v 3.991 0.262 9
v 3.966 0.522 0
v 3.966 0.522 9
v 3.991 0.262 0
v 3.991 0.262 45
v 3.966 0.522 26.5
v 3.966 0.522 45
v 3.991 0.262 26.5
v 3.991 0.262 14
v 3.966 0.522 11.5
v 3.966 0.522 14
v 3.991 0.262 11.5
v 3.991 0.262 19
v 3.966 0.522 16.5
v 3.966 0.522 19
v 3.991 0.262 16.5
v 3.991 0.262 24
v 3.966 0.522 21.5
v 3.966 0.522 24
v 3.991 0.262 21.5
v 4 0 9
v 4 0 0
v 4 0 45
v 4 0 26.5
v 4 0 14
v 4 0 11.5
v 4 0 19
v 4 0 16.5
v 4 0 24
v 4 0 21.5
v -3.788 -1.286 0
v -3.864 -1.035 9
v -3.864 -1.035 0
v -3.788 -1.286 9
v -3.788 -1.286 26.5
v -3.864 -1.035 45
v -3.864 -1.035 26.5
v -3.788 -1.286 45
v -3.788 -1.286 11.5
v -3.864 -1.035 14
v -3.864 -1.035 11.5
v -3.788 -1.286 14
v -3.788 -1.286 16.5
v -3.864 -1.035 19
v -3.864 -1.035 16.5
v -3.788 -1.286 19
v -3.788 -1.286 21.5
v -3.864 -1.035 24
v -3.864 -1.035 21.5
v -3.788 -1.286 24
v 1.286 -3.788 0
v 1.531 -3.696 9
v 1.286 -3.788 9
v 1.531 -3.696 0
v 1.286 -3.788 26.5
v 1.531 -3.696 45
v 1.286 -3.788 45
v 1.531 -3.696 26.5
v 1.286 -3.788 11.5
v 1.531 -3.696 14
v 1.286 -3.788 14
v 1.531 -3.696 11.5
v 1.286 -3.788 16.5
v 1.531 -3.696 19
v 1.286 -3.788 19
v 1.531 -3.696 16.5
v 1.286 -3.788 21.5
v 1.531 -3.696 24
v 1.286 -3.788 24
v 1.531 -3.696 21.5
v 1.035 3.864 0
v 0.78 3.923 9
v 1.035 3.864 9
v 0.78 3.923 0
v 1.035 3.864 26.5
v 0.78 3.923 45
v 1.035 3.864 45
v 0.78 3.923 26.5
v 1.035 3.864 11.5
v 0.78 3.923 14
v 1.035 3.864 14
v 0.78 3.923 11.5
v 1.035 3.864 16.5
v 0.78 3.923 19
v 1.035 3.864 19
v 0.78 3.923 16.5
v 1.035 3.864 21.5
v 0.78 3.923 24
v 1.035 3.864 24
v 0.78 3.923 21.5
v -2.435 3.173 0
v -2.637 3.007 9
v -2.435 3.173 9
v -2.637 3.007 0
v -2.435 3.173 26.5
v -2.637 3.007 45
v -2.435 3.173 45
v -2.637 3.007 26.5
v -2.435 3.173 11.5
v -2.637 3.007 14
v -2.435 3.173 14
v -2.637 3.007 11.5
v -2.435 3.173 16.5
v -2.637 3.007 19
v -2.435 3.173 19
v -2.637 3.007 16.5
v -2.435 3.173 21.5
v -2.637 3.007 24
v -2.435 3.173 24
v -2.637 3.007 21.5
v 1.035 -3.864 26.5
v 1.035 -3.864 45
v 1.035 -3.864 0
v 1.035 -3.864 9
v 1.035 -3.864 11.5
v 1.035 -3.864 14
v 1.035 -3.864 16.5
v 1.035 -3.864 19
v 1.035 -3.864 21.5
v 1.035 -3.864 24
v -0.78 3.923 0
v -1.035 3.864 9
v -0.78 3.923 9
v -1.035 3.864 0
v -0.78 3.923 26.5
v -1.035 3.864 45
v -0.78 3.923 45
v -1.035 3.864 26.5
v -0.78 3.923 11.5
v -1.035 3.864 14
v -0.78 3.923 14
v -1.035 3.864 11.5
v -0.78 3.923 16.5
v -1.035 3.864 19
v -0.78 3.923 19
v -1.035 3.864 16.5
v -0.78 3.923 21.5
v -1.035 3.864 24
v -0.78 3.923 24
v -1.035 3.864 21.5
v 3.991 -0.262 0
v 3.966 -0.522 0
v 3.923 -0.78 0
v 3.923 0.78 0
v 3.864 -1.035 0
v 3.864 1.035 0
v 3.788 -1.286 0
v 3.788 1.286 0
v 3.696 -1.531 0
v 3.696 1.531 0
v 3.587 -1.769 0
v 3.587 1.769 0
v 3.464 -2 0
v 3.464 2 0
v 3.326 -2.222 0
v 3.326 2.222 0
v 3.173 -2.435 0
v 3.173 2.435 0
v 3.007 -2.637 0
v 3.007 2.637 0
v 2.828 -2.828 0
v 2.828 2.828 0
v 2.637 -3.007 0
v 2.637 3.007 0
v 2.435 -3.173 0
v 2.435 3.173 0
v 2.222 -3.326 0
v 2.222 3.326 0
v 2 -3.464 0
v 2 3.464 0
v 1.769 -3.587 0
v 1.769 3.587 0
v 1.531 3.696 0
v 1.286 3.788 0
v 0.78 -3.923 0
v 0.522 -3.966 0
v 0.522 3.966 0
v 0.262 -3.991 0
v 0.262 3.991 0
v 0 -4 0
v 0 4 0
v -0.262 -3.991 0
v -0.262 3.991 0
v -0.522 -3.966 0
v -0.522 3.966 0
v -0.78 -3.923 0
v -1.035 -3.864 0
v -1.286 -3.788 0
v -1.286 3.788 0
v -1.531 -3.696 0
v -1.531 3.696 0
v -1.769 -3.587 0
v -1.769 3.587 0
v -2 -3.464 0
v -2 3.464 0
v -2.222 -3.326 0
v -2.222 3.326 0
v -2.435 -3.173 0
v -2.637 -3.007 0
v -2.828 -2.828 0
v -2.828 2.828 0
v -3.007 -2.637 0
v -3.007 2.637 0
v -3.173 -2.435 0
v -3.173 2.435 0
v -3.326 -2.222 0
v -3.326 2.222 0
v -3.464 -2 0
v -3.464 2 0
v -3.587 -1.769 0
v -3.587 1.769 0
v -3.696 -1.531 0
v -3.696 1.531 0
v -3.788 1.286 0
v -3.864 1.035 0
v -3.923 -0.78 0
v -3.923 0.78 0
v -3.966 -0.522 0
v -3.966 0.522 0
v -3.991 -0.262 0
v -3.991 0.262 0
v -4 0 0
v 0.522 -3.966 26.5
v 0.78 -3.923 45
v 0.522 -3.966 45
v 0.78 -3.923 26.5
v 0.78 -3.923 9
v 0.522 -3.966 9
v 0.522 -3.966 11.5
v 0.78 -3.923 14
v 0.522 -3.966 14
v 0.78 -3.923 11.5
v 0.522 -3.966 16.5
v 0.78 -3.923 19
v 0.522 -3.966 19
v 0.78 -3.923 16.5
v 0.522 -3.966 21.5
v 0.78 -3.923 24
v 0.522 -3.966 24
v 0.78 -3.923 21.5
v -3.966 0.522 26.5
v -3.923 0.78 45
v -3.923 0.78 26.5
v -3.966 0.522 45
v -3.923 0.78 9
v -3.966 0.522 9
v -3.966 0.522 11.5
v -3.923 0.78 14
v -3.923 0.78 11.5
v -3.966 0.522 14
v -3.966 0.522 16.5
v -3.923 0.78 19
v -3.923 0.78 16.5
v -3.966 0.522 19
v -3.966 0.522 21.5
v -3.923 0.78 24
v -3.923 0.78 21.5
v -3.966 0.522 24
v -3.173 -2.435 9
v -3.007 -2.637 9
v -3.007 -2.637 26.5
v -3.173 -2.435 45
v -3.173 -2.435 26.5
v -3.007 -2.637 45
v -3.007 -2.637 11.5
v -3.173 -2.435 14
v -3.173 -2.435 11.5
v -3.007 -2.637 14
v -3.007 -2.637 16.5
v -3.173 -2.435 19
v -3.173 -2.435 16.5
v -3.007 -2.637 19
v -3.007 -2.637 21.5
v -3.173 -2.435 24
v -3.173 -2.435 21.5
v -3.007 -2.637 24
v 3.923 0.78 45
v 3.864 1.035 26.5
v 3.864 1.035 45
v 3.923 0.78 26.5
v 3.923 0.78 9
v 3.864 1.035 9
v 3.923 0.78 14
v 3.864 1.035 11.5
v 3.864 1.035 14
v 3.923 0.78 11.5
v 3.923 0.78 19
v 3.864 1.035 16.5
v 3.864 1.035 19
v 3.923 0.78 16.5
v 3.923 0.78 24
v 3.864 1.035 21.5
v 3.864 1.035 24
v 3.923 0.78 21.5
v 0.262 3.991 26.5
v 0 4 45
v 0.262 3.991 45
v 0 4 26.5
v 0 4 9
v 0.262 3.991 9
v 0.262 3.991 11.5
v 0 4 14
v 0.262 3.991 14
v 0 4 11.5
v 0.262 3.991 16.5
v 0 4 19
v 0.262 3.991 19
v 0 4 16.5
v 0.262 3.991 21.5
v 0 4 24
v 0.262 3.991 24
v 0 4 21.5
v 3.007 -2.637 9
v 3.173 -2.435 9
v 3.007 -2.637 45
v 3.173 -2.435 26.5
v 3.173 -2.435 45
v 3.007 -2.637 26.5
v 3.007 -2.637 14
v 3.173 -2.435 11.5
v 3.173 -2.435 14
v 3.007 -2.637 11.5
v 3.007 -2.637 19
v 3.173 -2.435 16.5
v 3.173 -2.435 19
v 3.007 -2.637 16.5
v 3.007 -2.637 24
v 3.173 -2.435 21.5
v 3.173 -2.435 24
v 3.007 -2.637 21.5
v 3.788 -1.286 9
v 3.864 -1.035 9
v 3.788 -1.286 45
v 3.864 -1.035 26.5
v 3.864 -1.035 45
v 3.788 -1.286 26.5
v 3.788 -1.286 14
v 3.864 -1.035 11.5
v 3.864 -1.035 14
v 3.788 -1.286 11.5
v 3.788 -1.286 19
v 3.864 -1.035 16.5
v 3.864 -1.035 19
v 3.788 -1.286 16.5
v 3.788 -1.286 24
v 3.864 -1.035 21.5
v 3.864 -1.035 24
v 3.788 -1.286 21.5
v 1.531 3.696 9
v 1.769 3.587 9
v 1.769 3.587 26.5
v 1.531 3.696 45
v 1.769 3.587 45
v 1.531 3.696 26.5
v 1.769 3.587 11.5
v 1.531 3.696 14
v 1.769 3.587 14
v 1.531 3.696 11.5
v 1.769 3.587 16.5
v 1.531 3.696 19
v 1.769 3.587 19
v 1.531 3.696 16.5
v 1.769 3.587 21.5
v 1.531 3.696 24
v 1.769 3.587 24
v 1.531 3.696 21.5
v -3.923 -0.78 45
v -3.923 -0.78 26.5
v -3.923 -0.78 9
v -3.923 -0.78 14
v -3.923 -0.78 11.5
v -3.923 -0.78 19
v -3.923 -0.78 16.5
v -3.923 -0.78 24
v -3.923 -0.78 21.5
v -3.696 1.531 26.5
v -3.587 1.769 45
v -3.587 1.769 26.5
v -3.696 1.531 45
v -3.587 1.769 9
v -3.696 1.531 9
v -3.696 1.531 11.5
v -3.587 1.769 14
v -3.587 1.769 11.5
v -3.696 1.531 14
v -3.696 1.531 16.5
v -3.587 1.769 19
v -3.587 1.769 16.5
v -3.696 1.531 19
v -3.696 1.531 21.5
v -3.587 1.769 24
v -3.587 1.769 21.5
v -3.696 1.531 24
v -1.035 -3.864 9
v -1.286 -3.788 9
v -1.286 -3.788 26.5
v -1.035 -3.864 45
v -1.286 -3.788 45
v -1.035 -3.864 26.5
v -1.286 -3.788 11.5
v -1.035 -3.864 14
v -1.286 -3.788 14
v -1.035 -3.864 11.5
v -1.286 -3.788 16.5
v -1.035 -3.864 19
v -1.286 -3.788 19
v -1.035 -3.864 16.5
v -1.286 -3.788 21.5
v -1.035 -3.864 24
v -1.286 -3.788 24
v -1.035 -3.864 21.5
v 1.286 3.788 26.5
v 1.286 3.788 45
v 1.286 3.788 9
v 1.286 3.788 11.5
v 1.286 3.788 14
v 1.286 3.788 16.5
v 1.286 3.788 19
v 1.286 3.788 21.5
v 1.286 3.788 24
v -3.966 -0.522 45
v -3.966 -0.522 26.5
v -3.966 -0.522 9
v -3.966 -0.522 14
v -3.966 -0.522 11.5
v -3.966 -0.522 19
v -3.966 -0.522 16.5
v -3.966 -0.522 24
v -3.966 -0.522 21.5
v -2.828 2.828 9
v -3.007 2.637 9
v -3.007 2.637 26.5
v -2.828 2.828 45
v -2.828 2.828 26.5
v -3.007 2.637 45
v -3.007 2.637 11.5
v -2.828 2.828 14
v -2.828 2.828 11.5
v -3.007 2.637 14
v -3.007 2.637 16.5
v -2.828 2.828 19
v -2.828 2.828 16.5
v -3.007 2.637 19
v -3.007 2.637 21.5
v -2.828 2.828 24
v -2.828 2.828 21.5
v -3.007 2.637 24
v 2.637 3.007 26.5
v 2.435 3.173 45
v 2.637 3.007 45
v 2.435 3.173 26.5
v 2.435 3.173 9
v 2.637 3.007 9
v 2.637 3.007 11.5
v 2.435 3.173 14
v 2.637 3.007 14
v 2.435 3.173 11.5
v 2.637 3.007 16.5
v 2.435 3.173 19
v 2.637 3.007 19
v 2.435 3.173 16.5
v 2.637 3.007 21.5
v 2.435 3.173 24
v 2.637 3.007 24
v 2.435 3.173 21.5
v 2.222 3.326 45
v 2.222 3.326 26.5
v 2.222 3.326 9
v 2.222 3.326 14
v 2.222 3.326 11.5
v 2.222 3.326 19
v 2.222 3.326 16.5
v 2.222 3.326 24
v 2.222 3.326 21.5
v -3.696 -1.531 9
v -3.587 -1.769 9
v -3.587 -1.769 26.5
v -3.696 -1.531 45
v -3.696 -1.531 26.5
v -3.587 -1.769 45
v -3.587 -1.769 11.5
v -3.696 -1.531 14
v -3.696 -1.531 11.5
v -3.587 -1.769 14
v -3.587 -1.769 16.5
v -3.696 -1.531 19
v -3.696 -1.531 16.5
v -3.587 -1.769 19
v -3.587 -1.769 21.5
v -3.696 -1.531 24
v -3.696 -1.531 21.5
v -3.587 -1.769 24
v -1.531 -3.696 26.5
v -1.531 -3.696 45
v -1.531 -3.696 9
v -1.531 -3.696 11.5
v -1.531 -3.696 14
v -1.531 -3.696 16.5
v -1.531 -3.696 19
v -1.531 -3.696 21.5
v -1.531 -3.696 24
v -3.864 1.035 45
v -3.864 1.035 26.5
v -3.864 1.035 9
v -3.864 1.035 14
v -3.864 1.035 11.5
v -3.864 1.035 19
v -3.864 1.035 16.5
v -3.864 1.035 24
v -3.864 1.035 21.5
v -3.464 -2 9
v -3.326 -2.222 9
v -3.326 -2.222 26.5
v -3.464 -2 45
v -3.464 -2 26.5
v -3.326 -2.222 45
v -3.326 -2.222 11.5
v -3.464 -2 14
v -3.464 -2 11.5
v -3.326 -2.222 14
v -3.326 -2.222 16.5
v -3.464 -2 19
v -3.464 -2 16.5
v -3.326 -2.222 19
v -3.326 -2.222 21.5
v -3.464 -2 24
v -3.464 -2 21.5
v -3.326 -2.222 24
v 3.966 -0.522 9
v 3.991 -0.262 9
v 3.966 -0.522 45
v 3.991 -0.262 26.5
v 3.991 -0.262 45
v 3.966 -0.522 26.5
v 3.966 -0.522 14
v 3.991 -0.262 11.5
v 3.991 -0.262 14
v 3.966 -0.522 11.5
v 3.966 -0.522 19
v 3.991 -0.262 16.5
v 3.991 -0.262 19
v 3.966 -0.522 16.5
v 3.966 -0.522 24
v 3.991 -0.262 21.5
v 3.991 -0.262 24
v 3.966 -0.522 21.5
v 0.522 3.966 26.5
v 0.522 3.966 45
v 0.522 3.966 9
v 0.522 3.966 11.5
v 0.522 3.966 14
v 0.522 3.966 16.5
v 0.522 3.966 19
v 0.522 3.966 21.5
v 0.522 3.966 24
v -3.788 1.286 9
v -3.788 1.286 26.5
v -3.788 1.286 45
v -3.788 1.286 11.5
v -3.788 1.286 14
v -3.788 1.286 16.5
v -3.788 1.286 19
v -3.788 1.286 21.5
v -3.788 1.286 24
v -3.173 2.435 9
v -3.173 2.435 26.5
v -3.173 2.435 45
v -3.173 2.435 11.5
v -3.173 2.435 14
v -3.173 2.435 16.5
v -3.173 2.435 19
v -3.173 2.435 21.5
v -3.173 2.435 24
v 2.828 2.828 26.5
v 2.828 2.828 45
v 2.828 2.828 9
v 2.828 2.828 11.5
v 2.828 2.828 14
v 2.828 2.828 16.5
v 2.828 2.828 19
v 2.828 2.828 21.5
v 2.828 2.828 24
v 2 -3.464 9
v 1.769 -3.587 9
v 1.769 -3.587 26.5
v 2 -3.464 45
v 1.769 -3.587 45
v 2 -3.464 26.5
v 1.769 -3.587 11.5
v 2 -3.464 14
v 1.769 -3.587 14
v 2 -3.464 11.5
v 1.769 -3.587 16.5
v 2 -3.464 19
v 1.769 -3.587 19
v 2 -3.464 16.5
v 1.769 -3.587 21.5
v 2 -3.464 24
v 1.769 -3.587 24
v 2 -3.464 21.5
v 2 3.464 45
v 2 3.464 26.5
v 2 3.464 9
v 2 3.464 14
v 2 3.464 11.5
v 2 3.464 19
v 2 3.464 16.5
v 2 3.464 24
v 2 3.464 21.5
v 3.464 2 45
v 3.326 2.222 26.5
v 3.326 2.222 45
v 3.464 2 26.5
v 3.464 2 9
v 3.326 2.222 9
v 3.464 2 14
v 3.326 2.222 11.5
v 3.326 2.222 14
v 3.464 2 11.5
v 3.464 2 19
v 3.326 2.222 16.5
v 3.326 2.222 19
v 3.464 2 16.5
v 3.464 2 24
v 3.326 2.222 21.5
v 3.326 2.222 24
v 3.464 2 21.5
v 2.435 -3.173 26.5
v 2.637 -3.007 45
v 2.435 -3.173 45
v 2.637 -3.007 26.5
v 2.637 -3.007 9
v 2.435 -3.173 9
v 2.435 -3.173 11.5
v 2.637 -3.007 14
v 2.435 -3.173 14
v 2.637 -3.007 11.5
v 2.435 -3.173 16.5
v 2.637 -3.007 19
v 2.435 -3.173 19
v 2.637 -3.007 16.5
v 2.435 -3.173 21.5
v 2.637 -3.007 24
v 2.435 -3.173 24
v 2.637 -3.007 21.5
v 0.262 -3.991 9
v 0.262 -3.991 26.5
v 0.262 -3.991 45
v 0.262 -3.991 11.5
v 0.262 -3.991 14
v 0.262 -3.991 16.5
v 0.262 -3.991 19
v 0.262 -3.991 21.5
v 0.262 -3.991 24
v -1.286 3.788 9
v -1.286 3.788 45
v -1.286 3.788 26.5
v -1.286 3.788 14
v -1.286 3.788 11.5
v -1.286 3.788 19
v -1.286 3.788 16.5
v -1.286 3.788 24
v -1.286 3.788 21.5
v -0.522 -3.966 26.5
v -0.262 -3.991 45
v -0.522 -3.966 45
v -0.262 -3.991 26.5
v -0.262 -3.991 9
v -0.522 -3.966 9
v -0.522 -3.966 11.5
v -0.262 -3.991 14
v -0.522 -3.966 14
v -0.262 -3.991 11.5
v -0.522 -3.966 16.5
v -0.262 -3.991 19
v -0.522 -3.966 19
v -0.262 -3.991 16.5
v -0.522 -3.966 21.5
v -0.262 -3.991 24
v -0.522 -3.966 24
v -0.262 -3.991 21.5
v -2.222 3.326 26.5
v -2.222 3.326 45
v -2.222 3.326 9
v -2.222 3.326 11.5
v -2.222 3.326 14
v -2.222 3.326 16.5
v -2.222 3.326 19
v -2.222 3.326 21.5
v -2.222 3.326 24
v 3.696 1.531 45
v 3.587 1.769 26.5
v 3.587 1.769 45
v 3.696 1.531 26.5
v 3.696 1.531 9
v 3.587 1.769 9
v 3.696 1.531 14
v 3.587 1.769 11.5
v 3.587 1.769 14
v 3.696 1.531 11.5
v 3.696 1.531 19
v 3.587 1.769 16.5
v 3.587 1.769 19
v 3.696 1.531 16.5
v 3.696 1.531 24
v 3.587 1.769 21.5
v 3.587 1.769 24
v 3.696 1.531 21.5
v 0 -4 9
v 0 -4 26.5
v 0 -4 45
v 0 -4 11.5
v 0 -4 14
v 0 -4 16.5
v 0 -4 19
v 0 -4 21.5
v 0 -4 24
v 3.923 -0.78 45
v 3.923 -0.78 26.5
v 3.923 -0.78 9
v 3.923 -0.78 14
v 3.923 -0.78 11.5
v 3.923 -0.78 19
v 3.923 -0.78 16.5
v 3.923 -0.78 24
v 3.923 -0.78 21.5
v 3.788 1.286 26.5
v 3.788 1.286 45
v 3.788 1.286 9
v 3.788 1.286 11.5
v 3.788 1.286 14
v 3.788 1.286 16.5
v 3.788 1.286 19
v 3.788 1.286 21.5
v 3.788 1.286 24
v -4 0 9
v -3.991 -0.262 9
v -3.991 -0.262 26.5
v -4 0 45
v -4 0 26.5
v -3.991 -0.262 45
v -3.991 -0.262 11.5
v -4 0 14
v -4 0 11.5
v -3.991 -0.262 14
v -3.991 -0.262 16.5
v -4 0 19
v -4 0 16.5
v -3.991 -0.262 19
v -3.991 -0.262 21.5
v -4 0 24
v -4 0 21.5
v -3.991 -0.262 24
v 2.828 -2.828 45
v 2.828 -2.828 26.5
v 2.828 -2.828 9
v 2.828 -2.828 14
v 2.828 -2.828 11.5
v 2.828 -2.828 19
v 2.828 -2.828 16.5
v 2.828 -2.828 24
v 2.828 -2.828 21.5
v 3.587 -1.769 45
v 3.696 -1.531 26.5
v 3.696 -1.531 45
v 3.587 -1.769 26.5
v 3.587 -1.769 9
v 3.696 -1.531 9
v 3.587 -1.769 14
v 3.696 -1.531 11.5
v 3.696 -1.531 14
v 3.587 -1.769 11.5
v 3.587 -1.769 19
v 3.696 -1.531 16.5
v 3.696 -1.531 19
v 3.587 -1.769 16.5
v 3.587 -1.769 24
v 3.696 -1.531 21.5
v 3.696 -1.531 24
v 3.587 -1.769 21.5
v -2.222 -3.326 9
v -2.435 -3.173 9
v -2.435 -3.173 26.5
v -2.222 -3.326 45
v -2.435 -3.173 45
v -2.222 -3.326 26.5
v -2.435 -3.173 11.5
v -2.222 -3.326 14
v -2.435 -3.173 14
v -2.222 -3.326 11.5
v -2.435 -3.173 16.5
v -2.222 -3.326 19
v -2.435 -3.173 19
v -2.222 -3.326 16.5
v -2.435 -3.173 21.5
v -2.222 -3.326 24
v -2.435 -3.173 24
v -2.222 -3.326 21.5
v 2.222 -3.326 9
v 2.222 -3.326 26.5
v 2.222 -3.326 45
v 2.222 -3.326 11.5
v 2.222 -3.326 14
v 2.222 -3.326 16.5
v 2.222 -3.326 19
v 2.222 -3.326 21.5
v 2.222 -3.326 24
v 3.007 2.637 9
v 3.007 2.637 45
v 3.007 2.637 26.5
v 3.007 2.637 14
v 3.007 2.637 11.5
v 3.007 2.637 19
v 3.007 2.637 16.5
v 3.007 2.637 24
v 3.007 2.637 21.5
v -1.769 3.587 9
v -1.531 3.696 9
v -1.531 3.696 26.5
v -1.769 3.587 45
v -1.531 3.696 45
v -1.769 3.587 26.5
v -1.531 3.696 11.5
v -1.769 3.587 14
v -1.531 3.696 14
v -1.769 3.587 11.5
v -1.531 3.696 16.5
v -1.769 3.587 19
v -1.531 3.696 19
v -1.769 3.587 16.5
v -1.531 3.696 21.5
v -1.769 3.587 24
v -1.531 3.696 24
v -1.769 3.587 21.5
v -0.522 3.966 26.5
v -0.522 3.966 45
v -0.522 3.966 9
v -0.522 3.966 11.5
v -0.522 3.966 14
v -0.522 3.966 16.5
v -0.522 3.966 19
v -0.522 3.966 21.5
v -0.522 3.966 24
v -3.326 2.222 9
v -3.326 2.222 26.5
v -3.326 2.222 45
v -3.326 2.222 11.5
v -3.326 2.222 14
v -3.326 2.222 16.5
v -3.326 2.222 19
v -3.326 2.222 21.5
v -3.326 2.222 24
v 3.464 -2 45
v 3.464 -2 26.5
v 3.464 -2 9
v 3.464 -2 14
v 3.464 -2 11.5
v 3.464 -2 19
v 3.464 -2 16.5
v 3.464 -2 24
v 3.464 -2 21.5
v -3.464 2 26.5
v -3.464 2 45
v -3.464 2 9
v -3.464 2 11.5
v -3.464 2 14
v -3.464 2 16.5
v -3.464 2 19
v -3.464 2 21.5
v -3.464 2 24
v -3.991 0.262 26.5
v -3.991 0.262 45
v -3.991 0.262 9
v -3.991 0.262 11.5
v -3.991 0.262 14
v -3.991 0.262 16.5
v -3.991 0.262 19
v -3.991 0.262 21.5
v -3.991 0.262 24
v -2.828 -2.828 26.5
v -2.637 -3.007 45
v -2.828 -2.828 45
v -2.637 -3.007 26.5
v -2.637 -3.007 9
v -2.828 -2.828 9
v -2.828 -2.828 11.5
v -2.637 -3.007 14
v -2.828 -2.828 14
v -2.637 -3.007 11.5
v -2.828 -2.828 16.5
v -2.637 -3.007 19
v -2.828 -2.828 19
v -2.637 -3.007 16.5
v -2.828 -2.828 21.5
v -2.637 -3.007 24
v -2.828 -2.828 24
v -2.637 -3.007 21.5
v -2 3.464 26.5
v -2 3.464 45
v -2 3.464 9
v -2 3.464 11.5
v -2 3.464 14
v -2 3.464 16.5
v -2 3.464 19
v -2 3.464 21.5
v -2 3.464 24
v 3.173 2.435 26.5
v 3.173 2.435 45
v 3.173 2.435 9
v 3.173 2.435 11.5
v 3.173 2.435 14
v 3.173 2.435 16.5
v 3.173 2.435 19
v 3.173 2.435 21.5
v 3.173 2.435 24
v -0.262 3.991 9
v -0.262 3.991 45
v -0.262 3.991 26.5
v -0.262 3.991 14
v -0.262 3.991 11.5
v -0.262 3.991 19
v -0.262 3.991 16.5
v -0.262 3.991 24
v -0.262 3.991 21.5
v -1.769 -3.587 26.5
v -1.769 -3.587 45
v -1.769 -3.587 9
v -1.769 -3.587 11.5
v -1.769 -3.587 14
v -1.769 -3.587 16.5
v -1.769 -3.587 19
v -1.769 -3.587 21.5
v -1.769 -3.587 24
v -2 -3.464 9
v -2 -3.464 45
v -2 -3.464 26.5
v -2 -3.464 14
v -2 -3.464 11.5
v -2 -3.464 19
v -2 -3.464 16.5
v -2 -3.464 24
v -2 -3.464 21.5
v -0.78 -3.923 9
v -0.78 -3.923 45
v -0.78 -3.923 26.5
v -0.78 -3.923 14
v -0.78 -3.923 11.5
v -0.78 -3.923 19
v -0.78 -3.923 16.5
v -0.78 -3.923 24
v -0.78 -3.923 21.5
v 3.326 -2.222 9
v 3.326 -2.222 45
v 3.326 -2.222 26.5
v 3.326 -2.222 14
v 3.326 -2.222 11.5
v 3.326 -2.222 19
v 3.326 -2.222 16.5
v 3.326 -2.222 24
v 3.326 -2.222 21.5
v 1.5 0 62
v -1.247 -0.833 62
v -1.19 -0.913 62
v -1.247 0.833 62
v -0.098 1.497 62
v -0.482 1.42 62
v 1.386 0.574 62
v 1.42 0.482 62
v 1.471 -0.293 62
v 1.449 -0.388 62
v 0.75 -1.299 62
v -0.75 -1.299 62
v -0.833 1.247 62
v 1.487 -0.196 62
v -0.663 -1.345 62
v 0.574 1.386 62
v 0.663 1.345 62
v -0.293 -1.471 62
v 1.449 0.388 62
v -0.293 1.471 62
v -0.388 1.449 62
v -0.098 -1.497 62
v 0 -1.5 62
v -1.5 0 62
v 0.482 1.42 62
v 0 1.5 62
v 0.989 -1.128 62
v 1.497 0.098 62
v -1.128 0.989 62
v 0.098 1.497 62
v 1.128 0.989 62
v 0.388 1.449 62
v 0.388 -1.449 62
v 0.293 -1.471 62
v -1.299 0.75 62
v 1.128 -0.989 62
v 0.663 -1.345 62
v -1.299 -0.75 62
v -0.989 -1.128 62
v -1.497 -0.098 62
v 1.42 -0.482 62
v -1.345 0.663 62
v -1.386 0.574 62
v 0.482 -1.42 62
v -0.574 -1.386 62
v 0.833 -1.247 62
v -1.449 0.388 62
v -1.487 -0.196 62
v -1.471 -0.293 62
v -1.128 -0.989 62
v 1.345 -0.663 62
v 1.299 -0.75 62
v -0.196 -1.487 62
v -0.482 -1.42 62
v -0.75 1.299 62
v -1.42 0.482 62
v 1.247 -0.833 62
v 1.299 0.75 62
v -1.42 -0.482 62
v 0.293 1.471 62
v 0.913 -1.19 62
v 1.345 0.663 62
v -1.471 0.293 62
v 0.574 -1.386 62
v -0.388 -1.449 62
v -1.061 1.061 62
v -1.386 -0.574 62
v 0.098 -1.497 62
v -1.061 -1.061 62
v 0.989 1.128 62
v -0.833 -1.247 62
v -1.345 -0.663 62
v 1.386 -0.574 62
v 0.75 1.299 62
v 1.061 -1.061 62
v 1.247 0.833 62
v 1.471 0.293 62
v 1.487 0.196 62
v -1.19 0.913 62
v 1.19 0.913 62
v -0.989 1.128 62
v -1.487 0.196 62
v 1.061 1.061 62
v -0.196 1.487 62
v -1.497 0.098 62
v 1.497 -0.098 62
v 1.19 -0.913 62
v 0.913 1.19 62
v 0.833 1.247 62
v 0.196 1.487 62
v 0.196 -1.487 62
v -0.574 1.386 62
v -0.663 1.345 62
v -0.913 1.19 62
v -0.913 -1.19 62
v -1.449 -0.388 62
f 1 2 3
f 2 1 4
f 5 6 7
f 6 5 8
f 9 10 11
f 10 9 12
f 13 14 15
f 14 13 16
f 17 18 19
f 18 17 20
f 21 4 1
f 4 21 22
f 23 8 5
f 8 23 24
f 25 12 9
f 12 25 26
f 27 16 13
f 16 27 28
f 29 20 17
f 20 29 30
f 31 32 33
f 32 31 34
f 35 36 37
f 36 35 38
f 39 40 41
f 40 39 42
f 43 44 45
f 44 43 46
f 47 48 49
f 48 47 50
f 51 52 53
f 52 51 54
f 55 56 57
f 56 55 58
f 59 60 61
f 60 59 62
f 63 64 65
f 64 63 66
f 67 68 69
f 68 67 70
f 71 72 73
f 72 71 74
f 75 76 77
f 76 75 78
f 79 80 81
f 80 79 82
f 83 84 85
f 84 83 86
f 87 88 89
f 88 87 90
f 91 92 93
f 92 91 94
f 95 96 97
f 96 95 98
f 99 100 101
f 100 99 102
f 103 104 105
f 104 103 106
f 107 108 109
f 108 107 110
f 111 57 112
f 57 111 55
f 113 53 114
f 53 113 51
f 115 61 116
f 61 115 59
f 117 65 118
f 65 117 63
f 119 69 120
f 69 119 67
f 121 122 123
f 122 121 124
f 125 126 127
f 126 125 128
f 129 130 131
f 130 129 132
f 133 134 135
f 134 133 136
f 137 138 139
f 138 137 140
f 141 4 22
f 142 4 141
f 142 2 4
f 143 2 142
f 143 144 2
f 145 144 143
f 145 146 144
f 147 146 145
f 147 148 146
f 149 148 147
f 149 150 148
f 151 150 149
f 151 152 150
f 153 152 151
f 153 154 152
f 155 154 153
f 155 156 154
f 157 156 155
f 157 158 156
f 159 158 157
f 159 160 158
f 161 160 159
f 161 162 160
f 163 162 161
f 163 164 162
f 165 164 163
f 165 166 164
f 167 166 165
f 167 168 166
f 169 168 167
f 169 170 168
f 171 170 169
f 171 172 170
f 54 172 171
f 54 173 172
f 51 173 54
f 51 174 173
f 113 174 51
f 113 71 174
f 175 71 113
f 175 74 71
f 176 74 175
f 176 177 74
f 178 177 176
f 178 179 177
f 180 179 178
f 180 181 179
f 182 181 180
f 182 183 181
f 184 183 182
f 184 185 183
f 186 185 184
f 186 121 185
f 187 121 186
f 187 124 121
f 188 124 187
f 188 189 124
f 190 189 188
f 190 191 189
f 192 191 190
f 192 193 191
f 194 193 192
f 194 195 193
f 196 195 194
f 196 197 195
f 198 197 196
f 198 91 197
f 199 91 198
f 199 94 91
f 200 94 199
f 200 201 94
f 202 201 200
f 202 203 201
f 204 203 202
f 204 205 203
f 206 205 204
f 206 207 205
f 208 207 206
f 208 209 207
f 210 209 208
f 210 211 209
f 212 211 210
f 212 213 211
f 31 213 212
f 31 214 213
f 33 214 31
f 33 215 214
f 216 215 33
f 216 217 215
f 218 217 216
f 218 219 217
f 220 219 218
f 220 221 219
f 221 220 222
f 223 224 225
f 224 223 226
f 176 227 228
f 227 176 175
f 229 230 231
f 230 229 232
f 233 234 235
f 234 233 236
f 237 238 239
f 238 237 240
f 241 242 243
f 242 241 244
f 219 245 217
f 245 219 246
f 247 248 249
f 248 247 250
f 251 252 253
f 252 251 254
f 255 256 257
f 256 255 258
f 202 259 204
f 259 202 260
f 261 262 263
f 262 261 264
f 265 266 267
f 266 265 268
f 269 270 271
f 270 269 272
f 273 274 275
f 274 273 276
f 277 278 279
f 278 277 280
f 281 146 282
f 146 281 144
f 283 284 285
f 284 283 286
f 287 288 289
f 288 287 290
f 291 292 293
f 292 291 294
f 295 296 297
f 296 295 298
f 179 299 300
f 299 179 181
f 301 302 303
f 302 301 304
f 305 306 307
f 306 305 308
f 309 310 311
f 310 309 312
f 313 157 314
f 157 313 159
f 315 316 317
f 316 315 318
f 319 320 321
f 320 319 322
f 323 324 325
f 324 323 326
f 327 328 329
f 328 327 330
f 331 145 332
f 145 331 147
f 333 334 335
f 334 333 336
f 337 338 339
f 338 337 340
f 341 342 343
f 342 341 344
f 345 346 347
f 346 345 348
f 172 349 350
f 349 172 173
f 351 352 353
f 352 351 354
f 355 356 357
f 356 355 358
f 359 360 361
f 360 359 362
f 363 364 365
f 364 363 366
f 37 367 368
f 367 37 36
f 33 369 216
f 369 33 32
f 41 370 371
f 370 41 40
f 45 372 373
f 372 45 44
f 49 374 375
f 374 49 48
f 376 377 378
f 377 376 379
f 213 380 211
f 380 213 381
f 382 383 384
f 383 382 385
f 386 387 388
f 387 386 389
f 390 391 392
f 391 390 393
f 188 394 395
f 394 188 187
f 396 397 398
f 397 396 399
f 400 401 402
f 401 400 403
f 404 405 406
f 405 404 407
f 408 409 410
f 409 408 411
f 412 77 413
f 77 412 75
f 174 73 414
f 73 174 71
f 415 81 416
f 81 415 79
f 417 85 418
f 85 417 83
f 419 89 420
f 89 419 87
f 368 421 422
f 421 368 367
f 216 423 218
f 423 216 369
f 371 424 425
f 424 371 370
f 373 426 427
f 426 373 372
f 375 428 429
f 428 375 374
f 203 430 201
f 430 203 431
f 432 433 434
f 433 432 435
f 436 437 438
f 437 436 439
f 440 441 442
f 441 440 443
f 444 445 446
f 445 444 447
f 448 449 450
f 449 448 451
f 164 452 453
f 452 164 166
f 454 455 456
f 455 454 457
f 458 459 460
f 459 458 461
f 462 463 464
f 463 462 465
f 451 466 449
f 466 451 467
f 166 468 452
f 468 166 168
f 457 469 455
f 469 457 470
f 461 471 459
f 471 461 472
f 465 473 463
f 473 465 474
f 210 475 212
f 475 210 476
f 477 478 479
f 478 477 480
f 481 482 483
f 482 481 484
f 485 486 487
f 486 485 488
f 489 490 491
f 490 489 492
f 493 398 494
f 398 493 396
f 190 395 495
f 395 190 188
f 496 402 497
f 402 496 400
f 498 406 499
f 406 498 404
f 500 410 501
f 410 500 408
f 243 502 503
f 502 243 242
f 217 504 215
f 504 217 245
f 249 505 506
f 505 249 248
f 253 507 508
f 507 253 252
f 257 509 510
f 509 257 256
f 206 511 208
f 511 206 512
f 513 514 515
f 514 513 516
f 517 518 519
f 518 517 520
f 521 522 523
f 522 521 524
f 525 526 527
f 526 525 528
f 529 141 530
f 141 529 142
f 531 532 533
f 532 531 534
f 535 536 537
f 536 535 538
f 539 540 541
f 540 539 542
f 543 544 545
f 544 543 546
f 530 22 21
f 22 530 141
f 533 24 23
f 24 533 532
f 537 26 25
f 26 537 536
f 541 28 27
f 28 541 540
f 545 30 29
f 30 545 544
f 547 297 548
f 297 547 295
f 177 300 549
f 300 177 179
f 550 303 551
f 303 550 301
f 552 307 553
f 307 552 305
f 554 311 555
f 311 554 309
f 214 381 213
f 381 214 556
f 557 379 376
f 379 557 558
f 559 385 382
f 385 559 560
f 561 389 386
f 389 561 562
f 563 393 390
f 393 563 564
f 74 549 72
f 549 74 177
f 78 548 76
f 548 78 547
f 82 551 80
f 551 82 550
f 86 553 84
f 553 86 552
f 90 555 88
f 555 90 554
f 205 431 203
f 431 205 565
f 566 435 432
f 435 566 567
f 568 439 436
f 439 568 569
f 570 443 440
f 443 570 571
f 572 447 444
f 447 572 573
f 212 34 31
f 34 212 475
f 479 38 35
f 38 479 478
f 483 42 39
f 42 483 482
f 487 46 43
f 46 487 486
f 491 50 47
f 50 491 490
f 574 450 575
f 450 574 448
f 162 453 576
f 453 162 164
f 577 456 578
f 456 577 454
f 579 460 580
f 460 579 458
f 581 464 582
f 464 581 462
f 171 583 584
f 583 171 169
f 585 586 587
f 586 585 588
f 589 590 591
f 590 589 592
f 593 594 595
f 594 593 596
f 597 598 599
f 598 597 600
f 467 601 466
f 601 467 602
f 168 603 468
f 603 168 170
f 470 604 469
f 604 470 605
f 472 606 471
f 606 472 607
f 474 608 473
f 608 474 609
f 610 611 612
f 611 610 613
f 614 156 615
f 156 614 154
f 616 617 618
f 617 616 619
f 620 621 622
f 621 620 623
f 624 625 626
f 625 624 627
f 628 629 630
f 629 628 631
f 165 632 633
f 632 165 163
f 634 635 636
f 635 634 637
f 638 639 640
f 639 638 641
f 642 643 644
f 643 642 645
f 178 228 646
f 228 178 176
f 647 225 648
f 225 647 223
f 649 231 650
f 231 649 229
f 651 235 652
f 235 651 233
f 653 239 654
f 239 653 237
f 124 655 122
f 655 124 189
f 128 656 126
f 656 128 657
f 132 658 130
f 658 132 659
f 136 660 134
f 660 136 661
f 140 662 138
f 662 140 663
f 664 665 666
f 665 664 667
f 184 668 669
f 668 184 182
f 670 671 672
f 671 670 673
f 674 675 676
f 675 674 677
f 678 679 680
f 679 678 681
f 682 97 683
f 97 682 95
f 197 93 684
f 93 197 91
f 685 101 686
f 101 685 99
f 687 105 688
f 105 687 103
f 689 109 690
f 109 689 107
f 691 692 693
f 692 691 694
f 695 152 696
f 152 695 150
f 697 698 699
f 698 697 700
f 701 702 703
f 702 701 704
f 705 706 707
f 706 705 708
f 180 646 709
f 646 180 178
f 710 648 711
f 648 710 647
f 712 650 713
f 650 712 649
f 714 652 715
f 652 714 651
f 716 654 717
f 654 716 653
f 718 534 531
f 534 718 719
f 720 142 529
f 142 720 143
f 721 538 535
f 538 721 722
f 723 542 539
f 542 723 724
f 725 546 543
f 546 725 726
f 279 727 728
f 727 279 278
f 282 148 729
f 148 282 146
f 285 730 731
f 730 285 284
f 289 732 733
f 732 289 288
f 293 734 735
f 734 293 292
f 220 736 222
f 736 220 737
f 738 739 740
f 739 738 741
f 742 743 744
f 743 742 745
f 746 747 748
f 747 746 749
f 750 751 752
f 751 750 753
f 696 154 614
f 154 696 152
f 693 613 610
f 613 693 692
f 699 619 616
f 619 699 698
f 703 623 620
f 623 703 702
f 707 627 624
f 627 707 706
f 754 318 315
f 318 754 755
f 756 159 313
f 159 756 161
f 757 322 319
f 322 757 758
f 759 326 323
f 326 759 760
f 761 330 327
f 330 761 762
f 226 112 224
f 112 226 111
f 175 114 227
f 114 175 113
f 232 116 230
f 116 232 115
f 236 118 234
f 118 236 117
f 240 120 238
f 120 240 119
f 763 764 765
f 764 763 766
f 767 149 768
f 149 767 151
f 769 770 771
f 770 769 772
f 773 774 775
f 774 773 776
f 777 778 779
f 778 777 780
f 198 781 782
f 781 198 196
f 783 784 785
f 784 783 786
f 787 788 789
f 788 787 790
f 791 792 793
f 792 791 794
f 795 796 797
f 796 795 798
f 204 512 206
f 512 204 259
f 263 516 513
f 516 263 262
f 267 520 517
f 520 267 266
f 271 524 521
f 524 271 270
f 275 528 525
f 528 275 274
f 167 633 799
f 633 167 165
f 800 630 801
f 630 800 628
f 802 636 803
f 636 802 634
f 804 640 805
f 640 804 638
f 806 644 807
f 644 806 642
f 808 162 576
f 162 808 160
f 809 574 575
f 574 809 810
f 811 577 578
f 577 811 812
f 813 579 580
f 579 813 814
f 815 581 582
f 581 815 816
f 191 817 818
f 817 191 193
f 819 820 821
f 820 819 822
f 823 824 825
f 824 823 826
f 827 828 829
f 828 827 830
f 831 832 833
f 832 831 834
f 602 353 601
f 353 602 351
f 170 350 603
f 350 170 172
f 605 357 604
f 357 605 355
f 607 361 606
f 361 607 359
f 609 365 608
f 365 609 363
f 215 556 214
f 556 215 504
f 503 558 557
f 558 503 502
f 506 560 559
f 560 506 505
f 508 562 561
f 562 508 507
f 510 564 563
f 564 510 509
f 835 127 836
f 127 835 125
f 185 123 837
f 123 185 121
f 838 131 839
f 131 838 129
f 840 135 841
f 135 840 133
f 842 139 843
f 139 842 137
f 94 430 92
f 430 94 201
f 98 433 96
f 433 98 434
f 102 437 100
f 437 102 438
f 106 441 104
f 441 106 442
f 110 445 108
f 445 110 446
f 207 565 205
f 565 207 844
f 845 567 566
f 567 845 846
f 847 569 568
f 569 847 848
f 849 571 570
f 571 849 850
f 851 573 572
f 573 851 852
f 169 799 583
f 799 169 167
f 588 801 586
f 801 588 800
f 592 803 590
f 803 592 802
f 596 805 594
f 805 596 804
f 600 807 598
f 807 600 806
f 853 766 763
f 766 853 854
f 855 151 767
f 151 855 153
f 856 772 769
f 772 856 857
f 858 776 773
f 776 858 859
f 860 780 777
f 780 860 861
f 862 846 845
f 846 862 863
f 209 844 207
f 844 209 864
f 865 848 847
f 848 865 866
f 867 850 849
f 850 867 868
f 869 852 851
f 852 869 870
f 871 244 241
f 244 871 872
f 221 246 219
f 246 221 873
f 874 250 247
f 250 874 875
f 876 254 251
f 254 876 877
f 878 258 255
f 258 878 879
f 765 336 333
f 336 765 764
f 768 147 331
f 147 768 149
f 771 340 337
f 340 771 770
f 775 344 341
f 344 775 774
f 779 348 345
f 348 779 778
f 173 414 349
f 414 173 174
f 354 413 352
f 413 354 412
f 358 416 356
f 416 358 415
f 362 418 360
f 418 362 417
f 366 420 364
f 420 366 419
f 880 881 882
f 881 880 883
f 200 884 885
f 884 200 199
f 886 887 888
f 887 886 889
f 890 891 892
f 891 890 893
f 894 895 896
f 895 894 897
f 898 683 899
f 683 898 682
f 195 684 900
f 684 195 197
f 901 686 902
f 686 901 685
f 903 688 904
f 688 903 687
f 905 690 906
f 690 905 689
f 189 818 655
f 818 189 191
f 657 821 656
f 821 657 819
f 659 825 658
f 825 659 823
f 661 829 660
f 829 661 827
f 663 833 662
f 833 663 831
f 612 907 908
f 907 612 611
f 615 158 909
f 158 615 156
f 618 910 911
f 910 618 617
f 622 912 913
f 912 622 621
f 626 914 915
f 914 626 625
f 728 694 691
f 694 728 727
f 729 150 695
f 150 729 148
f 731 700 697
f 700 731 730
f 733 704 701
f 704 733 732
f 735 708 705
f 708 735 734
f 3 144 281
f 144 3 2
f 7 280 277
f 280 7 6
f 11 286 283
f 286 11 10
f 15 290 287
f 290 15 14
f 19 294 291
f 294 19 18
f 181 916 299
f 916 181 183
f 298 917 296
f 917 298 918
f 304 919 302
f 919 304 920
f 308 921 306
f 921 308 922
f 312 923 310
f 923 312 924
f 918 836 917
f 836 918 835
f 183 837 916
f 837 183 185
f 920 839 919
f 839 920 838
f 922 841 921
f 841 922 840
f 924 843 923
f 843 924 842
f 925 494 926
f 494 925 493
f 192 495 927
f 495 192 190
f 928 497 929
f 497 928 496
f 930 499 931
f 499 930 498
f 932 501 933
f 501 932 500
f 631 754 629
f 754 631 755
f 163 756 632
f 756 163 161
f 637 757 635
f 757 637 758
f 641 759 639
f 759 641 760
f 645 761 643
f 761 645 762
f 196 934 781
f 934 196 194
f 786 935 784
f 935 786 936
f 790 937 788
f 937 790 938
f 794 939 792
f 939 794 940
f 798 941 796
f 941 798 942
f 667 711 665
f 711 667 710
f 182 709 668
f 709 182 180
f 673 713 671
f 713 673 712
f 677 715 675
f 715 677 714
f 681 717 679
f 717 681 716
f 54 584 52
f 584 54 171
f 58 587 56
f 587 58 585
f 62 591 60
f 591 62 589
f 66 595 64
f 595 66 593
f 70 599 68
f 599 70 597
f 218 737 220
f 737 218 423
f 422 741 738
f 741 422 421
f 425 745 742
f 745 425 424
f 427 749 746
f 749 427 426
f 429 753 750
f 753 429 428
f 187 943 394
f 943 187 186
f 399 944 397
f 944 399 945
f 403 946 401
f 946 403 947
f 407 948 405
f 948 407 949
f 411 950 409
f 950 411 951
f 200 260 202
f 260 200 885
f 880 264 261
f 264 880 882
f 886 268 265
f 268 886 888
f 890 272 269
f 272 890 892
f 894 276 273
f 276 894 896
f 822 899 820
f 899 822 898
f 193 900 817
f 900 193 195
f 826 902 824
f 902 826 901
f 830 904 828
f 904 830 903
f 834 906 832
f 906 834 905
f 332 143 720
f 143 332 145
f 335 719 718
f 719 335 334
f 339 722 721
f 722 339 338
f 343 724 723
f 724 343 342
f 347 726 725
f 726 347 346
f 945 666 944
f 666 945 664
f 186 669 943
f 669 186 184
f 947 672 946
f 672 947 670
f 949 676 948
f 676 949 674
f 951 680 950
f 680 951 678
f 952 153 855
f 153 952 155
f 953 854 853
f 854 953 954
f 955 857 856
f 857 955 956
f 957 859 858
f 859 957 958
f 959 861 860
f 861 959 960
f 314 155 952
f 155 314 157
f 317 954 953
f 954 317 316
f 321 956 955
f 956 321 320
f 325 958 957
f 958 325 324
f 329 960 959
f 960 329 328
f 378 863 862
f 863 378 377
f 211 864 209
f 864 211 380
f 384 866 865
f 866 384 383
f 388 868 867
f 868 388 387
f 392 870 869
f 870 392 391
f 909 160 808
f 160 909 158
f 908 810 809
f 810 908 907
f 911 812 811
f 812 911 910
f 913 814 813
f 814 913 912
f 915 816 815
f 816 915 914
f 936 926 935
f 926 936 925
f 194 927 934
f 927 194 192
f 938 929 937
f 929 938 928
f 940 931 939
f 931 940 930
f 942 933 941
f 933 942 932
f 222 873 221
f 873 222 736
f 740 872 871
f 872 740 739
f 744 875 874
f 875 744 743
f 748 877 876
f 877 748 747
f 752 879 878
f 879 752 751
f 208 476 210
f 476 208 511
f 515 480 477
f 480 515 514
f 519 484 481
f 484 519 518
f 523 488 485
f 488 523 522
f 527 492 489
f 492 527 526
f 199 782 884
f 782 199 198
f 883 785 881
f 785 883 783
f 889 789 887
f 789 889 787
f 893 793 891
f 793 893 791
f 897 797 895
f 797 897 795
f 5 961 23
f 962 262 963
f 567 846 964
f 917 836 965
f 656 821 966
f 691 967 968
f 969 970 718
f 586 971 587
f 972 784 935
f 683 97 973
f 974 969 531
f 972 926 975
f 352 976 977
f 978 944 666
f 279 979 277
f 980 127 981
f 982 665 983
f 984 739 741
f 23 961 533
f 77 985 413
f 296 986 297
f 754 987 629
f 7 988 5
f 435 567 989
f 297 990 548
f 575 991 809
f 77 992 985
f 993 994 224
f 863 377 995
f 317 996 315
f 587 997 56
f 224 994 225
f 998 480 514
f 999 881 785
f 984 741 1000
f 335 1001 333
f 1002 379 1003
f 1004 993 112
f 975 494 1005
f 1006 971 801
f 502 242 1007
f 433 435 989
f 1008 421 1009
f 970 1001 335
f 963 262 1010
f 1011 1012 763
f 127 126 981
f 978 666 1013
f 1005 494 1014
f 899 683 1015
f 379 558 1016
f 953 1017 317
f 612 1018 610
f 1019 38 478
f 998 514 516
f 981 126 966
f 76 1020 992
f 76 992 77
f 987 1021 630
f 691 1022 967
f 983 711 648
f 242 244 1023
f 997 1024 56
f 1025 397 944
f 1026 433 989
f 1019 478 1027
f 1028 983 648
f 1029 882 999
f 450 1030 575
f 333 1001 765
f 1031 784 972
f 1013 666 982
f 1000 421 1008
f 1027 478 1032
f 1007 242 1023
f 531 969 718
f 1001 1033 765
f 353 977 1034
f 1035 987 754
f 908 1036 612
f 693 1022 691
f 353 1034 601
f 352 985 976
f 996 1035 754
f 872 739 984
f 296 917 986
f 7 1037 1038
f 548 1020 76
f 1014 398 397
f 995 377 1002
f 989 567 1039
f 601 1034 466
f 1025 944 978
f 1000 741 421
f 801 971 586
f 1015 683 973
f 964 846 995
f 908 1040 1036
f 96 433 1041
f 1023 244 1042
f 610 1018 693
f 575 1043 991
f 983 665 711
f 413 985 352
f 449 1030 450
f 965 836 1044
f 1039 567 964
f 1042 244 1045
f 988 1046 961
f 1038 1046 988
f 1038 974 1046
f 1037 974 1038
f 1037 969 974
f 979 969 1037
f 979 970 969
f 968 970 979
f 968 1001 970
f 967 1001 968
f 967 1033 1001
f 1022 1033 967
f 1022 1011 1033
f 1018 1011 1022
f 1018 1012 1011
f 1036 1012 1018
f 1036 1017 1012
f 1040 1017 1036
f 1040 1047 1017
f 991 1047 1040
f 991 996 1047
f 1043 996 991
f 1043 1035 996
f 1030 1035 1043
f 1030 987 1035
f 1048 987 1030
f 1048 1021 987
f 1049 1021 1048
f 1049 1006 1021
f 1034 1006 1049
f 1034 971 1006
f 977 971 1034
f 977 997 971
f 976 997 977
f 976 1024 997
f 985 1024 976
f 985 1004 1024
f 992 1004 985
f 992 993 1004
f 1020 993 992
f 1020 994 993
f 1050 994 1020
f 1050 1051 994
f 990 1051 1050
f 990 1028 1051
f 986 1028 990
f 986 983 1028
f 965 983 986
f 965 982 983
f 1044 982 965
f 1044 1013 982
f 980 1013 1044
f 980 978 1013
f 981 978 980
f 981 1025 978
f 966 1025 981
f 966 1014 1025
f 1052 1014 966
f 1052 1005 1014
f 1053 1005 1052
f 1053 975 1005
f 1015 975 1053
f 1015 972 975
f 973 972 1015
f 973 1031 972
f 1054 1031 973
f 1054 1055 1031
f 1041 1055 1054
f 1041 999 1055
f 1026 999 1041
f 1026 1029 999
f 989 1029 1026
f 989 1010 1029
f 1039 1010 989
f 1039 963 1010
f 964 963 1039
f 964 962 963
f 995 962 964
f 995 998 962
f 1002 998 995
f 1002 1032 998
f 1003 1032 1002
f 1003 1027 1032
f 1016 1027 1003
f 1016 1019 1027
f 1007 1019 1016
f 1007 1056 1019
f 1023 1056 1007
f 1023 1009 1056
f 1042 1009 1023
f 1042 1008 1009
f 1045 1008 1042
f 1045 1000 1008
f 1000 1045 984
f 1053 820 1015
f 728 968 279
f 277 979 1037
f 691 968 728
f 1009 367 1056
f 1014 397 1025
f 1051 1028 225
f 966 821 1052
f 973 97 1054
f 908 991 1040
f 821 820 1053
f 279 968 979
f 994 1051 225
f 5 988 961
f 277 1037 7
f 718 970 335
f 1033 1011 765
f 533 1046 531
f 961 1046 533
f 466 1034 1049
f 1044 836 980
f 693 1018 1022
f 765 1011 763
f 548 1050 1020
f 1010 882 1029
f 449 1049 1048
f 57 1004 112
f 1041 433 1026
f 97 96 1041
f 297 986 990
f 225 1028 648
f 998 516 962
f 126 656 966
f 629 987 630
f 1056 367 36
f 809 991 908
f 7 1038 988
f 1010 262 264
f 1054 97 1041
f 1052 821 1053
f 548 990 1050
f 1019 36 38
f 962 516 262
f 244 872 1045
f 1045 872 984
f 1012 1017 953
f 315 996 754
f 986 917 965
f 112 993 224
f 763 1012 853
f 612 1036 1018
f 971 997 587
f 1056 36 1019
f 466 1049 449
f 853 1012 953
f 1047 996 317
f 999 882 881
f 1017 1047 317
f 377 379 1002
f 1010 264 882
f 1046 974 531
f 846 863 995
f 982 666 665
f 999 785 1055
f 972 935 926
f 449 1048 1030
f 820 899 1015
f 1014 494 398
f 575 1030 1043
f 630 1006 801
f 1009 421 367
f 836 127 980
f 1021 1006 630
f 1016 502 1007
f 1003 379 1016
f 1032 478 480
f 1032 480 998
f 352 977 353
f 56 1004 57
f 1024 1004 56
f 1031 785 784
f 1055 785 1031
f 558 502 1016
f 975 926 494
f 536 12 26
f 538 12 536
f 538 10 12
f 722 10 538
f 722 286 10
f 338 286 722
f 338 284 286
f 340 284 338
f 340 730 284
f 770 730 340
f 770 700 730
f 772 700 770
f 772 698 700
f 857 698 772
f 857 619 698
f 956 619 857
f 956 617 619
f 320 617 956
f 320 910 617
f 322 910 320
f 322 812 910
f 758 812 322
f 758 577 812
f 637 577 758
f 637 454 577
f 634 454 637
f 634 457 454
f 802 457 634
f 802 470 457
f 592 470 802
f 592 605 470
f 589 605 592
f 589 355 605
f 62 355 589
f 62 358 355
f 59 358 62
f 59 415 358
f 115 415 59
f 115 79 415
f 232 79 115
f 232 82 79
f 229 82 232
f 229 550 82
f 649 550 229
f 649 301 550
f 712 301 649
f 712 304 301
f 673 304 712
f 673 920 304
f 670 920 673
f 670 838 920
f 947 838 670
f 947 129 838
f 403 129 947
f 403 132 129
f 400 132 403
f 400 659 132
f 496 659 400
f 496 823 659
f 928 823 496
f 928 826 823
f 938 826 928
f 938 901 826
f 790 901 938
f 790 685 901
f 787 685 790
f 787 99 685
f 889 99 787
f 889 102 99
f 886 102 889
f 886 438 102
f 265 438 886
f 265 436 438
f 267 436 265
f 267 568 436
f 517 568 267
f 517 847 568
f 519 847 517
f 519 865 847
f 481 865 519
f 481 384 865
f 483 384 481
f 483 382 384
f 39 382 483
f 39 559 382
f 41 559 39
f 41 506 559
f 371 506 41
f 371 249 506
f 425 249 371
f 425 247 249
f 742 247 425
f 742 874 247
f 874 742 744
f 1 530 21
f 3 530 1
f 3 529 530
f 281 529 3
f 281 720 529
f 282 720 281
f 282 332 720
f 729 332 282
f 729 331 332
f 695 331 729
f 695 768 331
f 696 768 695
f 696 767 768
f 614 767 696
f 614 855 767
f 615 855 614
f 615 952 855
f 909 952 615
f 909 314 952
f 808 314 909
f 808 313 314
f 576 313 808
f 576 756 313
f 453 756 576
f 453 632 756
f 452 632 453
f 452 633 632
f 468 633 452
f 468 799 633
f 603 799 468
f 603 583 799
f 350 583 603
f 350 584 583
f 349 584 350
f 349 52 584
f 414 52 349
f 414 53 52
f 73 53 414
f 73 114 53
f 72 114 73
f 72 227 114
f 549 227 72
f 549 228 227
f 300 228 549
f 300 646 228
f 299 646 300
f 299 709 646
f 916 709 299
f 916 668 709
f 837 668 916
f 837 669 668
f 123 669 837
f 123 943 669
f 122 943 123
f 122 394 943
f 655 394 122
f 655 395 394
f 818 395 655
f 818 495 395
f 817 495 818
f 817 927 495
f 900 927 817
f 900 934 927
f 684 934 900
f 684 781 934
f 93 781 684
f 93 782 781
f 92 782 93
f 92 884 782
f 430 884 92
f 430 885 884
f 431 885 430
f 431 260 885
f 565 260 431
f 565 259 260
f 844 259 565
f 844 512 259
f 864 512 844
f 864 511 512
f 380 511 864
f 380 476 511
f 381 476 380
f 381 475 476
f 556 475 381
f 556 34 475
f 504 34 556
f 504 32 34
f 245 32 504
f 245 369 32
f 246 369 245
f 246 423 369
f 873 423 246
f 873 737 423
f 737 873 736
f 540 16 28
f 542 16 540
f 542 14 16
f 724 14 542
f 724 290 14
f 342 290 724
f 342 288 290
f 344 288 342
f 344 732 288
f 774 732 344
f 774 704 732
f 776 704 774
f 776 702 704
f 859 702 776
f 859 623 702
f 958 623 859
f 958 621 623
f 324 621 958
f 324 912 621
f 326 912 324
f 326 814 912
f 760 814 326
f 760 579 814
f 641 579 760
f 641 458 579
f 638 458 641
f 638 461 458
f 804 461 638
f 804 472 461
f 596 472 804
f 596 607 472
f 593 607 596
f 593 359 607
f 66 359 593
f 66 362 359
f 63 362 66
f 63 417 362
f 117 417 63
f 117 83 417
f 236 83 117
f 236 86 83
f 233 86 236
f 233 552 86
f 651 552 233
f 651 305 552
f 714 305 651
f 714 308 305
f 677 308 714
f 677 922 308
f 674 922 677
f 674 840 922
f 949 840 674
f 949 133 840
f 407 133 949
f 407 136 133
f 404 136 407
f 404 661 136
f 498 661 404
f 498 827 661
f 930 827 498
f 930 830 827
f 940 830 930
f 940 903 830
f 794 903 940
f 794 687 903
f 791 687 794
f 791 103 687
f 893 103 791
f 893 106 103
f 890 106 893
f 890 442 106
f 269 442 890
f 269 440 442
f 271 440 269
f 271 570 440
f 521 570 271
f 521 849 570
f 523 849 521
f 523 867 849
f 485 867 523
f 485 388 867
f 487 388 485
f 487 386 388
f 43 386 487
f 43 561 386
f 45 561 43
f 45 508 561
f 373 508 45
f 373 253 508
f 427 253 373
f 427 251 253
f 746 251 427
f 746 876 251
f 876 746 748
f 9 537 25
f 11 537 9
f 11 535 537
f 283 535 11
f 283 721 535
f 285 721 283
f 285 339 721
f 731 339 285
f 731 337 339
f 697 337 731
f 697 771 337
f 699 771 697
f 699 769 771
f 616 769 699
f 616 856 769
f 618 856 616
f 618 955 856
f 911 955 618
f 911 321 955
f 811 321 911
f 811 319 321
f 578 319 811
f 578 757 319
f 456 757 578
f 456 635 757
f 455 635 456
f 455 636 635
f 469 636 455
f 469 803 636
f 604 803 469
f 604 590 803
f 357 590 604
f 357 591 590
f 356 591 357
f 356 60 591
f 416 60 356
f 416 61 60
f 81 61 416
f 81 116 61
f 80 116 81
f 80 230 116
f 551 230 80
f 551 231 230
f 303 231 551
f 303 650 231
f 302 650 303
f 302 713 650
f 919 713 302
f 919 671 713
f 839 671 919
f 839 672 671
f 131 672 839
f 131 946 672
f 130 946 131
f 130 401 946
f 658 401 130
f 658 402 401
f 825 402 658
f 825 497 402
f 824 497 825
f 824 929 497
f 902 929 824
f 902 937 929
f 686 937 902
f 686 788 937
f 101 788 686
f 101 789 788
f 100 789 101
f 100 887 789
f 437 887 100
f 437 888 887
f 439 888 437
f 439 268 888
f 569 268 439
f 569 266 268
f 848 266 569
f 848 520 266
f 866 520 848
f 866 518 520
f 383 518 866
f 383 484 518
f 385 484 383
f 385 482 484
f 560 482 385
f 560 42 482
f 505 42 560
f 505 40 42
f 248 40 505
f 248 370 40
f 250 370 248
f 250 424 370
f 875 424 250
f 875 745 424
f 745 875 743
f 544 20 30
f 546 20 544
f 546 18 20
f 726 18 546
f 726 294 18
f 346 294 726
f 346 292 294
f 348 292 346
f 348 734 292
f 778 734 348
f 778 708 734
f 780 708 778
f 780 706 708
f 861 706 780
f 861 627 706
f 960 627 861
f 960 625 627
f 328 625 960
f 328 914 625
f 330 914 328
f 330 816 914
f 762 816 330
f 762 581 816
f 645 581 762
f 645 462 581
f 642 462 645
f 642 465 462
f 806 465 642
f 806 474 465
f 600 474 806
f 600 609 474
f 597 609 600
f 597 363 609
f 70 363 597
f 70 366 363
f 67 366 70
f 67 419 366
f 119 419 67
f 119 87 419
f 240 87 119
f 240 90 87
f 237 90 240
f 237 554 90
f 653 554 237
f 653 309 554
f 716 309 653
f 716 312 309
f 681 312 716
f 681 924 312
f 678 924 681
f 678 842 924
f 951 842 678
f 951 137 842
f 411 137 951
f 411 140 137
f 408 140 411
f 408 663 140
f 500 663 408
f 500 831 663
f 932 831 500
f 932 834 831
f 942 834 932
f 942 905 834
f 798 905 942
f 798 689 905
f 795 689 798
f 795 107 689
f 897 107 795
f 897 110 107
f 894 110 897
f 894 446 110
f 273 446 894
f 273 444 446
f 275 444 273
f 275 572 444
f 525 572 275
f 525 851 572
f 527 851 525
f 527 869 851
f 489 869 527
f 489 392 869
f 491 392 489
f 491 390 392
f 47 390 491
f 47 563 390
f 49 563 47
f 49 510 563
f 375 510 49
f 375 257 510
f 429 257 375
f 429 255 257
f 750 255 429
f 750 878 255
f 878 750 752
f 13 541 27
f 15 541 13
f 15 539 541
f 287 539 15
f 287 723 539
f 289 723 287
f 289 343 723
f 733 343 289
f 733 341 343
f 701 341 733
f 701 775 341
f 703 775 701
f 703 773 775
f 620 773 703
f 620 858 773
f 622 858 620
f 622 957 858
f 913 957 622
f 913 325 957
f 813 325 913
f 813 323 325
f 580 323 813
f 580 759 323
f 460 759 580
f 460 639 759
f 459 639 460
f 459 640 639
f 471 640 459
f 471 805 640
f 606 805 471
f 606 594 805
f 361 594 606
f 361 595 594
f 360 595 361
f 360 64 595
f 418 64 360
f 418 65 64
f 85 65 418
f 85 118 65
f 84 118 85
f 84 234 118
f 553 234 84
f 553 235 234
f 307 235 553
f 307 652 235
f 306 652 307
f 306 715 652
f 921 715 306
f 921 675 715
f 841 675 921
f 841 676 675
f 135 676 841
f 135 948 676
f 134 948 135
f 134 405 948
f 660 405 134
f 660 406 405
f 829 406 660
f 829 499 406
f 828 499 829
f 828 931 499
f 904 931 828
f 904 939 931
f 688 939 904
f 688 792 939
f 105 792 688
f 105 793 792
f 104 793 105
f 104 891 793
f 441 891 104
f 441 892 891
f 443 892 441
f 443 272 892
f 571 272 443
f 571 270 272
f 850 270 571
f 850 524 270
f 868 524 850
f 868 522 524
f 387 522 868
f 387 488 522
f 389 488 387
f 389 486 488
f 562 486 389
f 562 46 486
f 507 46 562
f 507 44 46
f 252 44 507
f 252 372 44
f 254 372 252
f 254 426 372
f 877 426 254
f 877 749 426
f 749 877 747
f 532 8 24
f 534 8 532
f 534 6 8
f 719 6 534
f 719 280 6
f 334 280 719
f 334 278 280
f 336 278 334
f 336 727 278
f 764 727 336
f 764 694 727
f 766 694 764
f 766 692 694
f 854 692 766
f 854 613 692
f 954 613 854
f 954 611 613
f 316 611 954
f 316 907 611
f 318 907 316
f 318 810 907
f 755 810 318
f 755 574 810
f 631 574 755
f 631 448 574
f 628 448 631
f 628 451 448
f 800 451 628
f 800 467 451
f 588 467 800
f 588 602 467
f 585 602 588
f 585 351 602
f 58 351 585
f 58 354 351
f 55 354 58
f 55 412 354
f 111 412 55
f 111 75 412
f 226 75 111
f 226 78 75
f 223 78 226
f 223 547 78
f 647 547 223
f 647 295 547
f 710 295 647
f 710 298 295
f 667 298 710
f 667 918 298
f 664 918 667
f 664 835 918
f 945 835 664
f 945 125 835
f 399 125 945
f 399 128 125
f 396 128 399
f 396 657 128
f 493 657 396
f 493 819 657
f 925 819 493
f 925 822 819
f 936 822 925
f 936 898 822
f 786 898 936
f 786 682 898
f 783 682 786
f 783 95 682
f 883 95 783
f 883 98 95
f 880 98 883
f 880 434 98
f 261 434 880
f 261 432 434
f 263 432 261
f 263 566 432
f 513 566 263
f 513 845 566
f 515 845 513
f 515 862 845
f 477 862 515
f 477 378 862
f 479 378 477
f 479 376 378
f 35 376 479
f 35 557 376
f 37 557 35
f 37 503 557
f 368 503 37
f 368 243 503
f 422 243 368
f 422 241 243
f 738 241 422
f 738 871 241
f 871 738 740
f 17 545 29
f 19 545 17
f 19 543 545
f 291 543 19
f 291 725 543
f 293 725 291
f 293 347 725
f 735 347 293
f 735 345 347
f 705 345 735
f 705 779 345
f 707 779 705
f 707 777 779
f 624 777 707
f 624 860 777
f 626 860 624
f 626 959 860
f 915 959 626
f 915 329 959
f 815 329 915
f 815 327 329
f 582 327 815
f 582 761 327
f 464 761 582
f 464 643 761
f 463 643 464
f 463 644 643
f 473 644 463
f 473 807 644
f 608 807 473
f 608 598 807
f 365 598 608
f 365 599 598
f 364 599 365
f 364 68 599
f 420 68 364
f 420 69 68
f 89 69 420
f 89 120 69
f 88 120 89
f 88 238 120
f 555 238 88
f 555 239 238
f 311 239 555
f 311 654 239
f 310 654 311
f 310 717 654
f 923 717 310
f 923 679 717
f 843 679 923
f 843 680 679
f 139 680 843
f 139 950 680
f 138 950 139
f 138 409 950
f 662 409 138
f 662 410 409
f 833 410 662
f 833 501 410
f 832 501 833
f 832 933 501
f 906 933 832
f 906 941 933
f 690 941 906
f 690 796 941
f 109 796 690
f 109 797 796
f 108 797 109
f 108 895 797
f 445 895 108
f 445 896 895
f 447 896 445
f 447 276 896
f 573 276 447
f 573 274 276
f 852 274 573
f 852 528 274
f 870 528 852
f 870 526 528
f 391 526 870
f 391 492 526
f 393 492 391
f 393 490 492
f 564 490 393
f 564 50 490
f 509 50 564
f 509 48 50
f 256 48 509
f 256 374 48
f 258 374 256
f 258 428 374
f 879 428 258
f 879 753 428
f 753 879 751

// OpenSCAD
// Pestle for grinding tissue inside a 1.5 mL microcentrifuge tube
// Print orientation: standing upright on the bed (z = 0), centred on origin in X/Y

// ---------------- Parameters ----------------
handle_d      = 8;    // handle diameter (mm)
handle_h      = 45;   // handle height (mm), z = 0..45
cone_d_bottom = 8;    // cone diameter at handle top (mm)
cone_d_top    = 3;    // cone diameter at tip base (mm)
cone_top_z    = 62;   // cone top / sphere centre height (mm)
sphere_d      = 3;    // tip sphere diameter (mm)
groove_count  = 4;    // number of circumferential grooves
groove_w      = 2;    // groove width (mm) in Z
groove_depth  = 1;    // groove depth (mm)
eps           = 0.5;  // overcut for clean differences (mm)
$fn           = 96;   // curve resolution

// ---------------- Model ----------------
difference() {
    union() {
        // Handle
        cylinder(d = handle_d, h = handle_h);

        // Cone: from handle top (z = 45) to sphere centre (z = 62)
        translate([0, 0, handle_h])
            cylinder(d1 = cone_d_bottom, d2 = cone_d_top, h = cone_top_z - handle_h);

        // Rounded tip sphere
        translate([0, 0, cone_top_z - sphere_d / 2])
            sphere(d = sphere_d);
    }

    // Grip grooves, centred at z = 10, 15, 20, 25
    for (i = [0 : groove_count - 1]) {
        z_c = 10 + i * 5;
        translate([0, 0, z_c - groove_w / 2])
            cylinder(d = handle_d + 2 * eps, h = groove_w + eps);
    }
}
